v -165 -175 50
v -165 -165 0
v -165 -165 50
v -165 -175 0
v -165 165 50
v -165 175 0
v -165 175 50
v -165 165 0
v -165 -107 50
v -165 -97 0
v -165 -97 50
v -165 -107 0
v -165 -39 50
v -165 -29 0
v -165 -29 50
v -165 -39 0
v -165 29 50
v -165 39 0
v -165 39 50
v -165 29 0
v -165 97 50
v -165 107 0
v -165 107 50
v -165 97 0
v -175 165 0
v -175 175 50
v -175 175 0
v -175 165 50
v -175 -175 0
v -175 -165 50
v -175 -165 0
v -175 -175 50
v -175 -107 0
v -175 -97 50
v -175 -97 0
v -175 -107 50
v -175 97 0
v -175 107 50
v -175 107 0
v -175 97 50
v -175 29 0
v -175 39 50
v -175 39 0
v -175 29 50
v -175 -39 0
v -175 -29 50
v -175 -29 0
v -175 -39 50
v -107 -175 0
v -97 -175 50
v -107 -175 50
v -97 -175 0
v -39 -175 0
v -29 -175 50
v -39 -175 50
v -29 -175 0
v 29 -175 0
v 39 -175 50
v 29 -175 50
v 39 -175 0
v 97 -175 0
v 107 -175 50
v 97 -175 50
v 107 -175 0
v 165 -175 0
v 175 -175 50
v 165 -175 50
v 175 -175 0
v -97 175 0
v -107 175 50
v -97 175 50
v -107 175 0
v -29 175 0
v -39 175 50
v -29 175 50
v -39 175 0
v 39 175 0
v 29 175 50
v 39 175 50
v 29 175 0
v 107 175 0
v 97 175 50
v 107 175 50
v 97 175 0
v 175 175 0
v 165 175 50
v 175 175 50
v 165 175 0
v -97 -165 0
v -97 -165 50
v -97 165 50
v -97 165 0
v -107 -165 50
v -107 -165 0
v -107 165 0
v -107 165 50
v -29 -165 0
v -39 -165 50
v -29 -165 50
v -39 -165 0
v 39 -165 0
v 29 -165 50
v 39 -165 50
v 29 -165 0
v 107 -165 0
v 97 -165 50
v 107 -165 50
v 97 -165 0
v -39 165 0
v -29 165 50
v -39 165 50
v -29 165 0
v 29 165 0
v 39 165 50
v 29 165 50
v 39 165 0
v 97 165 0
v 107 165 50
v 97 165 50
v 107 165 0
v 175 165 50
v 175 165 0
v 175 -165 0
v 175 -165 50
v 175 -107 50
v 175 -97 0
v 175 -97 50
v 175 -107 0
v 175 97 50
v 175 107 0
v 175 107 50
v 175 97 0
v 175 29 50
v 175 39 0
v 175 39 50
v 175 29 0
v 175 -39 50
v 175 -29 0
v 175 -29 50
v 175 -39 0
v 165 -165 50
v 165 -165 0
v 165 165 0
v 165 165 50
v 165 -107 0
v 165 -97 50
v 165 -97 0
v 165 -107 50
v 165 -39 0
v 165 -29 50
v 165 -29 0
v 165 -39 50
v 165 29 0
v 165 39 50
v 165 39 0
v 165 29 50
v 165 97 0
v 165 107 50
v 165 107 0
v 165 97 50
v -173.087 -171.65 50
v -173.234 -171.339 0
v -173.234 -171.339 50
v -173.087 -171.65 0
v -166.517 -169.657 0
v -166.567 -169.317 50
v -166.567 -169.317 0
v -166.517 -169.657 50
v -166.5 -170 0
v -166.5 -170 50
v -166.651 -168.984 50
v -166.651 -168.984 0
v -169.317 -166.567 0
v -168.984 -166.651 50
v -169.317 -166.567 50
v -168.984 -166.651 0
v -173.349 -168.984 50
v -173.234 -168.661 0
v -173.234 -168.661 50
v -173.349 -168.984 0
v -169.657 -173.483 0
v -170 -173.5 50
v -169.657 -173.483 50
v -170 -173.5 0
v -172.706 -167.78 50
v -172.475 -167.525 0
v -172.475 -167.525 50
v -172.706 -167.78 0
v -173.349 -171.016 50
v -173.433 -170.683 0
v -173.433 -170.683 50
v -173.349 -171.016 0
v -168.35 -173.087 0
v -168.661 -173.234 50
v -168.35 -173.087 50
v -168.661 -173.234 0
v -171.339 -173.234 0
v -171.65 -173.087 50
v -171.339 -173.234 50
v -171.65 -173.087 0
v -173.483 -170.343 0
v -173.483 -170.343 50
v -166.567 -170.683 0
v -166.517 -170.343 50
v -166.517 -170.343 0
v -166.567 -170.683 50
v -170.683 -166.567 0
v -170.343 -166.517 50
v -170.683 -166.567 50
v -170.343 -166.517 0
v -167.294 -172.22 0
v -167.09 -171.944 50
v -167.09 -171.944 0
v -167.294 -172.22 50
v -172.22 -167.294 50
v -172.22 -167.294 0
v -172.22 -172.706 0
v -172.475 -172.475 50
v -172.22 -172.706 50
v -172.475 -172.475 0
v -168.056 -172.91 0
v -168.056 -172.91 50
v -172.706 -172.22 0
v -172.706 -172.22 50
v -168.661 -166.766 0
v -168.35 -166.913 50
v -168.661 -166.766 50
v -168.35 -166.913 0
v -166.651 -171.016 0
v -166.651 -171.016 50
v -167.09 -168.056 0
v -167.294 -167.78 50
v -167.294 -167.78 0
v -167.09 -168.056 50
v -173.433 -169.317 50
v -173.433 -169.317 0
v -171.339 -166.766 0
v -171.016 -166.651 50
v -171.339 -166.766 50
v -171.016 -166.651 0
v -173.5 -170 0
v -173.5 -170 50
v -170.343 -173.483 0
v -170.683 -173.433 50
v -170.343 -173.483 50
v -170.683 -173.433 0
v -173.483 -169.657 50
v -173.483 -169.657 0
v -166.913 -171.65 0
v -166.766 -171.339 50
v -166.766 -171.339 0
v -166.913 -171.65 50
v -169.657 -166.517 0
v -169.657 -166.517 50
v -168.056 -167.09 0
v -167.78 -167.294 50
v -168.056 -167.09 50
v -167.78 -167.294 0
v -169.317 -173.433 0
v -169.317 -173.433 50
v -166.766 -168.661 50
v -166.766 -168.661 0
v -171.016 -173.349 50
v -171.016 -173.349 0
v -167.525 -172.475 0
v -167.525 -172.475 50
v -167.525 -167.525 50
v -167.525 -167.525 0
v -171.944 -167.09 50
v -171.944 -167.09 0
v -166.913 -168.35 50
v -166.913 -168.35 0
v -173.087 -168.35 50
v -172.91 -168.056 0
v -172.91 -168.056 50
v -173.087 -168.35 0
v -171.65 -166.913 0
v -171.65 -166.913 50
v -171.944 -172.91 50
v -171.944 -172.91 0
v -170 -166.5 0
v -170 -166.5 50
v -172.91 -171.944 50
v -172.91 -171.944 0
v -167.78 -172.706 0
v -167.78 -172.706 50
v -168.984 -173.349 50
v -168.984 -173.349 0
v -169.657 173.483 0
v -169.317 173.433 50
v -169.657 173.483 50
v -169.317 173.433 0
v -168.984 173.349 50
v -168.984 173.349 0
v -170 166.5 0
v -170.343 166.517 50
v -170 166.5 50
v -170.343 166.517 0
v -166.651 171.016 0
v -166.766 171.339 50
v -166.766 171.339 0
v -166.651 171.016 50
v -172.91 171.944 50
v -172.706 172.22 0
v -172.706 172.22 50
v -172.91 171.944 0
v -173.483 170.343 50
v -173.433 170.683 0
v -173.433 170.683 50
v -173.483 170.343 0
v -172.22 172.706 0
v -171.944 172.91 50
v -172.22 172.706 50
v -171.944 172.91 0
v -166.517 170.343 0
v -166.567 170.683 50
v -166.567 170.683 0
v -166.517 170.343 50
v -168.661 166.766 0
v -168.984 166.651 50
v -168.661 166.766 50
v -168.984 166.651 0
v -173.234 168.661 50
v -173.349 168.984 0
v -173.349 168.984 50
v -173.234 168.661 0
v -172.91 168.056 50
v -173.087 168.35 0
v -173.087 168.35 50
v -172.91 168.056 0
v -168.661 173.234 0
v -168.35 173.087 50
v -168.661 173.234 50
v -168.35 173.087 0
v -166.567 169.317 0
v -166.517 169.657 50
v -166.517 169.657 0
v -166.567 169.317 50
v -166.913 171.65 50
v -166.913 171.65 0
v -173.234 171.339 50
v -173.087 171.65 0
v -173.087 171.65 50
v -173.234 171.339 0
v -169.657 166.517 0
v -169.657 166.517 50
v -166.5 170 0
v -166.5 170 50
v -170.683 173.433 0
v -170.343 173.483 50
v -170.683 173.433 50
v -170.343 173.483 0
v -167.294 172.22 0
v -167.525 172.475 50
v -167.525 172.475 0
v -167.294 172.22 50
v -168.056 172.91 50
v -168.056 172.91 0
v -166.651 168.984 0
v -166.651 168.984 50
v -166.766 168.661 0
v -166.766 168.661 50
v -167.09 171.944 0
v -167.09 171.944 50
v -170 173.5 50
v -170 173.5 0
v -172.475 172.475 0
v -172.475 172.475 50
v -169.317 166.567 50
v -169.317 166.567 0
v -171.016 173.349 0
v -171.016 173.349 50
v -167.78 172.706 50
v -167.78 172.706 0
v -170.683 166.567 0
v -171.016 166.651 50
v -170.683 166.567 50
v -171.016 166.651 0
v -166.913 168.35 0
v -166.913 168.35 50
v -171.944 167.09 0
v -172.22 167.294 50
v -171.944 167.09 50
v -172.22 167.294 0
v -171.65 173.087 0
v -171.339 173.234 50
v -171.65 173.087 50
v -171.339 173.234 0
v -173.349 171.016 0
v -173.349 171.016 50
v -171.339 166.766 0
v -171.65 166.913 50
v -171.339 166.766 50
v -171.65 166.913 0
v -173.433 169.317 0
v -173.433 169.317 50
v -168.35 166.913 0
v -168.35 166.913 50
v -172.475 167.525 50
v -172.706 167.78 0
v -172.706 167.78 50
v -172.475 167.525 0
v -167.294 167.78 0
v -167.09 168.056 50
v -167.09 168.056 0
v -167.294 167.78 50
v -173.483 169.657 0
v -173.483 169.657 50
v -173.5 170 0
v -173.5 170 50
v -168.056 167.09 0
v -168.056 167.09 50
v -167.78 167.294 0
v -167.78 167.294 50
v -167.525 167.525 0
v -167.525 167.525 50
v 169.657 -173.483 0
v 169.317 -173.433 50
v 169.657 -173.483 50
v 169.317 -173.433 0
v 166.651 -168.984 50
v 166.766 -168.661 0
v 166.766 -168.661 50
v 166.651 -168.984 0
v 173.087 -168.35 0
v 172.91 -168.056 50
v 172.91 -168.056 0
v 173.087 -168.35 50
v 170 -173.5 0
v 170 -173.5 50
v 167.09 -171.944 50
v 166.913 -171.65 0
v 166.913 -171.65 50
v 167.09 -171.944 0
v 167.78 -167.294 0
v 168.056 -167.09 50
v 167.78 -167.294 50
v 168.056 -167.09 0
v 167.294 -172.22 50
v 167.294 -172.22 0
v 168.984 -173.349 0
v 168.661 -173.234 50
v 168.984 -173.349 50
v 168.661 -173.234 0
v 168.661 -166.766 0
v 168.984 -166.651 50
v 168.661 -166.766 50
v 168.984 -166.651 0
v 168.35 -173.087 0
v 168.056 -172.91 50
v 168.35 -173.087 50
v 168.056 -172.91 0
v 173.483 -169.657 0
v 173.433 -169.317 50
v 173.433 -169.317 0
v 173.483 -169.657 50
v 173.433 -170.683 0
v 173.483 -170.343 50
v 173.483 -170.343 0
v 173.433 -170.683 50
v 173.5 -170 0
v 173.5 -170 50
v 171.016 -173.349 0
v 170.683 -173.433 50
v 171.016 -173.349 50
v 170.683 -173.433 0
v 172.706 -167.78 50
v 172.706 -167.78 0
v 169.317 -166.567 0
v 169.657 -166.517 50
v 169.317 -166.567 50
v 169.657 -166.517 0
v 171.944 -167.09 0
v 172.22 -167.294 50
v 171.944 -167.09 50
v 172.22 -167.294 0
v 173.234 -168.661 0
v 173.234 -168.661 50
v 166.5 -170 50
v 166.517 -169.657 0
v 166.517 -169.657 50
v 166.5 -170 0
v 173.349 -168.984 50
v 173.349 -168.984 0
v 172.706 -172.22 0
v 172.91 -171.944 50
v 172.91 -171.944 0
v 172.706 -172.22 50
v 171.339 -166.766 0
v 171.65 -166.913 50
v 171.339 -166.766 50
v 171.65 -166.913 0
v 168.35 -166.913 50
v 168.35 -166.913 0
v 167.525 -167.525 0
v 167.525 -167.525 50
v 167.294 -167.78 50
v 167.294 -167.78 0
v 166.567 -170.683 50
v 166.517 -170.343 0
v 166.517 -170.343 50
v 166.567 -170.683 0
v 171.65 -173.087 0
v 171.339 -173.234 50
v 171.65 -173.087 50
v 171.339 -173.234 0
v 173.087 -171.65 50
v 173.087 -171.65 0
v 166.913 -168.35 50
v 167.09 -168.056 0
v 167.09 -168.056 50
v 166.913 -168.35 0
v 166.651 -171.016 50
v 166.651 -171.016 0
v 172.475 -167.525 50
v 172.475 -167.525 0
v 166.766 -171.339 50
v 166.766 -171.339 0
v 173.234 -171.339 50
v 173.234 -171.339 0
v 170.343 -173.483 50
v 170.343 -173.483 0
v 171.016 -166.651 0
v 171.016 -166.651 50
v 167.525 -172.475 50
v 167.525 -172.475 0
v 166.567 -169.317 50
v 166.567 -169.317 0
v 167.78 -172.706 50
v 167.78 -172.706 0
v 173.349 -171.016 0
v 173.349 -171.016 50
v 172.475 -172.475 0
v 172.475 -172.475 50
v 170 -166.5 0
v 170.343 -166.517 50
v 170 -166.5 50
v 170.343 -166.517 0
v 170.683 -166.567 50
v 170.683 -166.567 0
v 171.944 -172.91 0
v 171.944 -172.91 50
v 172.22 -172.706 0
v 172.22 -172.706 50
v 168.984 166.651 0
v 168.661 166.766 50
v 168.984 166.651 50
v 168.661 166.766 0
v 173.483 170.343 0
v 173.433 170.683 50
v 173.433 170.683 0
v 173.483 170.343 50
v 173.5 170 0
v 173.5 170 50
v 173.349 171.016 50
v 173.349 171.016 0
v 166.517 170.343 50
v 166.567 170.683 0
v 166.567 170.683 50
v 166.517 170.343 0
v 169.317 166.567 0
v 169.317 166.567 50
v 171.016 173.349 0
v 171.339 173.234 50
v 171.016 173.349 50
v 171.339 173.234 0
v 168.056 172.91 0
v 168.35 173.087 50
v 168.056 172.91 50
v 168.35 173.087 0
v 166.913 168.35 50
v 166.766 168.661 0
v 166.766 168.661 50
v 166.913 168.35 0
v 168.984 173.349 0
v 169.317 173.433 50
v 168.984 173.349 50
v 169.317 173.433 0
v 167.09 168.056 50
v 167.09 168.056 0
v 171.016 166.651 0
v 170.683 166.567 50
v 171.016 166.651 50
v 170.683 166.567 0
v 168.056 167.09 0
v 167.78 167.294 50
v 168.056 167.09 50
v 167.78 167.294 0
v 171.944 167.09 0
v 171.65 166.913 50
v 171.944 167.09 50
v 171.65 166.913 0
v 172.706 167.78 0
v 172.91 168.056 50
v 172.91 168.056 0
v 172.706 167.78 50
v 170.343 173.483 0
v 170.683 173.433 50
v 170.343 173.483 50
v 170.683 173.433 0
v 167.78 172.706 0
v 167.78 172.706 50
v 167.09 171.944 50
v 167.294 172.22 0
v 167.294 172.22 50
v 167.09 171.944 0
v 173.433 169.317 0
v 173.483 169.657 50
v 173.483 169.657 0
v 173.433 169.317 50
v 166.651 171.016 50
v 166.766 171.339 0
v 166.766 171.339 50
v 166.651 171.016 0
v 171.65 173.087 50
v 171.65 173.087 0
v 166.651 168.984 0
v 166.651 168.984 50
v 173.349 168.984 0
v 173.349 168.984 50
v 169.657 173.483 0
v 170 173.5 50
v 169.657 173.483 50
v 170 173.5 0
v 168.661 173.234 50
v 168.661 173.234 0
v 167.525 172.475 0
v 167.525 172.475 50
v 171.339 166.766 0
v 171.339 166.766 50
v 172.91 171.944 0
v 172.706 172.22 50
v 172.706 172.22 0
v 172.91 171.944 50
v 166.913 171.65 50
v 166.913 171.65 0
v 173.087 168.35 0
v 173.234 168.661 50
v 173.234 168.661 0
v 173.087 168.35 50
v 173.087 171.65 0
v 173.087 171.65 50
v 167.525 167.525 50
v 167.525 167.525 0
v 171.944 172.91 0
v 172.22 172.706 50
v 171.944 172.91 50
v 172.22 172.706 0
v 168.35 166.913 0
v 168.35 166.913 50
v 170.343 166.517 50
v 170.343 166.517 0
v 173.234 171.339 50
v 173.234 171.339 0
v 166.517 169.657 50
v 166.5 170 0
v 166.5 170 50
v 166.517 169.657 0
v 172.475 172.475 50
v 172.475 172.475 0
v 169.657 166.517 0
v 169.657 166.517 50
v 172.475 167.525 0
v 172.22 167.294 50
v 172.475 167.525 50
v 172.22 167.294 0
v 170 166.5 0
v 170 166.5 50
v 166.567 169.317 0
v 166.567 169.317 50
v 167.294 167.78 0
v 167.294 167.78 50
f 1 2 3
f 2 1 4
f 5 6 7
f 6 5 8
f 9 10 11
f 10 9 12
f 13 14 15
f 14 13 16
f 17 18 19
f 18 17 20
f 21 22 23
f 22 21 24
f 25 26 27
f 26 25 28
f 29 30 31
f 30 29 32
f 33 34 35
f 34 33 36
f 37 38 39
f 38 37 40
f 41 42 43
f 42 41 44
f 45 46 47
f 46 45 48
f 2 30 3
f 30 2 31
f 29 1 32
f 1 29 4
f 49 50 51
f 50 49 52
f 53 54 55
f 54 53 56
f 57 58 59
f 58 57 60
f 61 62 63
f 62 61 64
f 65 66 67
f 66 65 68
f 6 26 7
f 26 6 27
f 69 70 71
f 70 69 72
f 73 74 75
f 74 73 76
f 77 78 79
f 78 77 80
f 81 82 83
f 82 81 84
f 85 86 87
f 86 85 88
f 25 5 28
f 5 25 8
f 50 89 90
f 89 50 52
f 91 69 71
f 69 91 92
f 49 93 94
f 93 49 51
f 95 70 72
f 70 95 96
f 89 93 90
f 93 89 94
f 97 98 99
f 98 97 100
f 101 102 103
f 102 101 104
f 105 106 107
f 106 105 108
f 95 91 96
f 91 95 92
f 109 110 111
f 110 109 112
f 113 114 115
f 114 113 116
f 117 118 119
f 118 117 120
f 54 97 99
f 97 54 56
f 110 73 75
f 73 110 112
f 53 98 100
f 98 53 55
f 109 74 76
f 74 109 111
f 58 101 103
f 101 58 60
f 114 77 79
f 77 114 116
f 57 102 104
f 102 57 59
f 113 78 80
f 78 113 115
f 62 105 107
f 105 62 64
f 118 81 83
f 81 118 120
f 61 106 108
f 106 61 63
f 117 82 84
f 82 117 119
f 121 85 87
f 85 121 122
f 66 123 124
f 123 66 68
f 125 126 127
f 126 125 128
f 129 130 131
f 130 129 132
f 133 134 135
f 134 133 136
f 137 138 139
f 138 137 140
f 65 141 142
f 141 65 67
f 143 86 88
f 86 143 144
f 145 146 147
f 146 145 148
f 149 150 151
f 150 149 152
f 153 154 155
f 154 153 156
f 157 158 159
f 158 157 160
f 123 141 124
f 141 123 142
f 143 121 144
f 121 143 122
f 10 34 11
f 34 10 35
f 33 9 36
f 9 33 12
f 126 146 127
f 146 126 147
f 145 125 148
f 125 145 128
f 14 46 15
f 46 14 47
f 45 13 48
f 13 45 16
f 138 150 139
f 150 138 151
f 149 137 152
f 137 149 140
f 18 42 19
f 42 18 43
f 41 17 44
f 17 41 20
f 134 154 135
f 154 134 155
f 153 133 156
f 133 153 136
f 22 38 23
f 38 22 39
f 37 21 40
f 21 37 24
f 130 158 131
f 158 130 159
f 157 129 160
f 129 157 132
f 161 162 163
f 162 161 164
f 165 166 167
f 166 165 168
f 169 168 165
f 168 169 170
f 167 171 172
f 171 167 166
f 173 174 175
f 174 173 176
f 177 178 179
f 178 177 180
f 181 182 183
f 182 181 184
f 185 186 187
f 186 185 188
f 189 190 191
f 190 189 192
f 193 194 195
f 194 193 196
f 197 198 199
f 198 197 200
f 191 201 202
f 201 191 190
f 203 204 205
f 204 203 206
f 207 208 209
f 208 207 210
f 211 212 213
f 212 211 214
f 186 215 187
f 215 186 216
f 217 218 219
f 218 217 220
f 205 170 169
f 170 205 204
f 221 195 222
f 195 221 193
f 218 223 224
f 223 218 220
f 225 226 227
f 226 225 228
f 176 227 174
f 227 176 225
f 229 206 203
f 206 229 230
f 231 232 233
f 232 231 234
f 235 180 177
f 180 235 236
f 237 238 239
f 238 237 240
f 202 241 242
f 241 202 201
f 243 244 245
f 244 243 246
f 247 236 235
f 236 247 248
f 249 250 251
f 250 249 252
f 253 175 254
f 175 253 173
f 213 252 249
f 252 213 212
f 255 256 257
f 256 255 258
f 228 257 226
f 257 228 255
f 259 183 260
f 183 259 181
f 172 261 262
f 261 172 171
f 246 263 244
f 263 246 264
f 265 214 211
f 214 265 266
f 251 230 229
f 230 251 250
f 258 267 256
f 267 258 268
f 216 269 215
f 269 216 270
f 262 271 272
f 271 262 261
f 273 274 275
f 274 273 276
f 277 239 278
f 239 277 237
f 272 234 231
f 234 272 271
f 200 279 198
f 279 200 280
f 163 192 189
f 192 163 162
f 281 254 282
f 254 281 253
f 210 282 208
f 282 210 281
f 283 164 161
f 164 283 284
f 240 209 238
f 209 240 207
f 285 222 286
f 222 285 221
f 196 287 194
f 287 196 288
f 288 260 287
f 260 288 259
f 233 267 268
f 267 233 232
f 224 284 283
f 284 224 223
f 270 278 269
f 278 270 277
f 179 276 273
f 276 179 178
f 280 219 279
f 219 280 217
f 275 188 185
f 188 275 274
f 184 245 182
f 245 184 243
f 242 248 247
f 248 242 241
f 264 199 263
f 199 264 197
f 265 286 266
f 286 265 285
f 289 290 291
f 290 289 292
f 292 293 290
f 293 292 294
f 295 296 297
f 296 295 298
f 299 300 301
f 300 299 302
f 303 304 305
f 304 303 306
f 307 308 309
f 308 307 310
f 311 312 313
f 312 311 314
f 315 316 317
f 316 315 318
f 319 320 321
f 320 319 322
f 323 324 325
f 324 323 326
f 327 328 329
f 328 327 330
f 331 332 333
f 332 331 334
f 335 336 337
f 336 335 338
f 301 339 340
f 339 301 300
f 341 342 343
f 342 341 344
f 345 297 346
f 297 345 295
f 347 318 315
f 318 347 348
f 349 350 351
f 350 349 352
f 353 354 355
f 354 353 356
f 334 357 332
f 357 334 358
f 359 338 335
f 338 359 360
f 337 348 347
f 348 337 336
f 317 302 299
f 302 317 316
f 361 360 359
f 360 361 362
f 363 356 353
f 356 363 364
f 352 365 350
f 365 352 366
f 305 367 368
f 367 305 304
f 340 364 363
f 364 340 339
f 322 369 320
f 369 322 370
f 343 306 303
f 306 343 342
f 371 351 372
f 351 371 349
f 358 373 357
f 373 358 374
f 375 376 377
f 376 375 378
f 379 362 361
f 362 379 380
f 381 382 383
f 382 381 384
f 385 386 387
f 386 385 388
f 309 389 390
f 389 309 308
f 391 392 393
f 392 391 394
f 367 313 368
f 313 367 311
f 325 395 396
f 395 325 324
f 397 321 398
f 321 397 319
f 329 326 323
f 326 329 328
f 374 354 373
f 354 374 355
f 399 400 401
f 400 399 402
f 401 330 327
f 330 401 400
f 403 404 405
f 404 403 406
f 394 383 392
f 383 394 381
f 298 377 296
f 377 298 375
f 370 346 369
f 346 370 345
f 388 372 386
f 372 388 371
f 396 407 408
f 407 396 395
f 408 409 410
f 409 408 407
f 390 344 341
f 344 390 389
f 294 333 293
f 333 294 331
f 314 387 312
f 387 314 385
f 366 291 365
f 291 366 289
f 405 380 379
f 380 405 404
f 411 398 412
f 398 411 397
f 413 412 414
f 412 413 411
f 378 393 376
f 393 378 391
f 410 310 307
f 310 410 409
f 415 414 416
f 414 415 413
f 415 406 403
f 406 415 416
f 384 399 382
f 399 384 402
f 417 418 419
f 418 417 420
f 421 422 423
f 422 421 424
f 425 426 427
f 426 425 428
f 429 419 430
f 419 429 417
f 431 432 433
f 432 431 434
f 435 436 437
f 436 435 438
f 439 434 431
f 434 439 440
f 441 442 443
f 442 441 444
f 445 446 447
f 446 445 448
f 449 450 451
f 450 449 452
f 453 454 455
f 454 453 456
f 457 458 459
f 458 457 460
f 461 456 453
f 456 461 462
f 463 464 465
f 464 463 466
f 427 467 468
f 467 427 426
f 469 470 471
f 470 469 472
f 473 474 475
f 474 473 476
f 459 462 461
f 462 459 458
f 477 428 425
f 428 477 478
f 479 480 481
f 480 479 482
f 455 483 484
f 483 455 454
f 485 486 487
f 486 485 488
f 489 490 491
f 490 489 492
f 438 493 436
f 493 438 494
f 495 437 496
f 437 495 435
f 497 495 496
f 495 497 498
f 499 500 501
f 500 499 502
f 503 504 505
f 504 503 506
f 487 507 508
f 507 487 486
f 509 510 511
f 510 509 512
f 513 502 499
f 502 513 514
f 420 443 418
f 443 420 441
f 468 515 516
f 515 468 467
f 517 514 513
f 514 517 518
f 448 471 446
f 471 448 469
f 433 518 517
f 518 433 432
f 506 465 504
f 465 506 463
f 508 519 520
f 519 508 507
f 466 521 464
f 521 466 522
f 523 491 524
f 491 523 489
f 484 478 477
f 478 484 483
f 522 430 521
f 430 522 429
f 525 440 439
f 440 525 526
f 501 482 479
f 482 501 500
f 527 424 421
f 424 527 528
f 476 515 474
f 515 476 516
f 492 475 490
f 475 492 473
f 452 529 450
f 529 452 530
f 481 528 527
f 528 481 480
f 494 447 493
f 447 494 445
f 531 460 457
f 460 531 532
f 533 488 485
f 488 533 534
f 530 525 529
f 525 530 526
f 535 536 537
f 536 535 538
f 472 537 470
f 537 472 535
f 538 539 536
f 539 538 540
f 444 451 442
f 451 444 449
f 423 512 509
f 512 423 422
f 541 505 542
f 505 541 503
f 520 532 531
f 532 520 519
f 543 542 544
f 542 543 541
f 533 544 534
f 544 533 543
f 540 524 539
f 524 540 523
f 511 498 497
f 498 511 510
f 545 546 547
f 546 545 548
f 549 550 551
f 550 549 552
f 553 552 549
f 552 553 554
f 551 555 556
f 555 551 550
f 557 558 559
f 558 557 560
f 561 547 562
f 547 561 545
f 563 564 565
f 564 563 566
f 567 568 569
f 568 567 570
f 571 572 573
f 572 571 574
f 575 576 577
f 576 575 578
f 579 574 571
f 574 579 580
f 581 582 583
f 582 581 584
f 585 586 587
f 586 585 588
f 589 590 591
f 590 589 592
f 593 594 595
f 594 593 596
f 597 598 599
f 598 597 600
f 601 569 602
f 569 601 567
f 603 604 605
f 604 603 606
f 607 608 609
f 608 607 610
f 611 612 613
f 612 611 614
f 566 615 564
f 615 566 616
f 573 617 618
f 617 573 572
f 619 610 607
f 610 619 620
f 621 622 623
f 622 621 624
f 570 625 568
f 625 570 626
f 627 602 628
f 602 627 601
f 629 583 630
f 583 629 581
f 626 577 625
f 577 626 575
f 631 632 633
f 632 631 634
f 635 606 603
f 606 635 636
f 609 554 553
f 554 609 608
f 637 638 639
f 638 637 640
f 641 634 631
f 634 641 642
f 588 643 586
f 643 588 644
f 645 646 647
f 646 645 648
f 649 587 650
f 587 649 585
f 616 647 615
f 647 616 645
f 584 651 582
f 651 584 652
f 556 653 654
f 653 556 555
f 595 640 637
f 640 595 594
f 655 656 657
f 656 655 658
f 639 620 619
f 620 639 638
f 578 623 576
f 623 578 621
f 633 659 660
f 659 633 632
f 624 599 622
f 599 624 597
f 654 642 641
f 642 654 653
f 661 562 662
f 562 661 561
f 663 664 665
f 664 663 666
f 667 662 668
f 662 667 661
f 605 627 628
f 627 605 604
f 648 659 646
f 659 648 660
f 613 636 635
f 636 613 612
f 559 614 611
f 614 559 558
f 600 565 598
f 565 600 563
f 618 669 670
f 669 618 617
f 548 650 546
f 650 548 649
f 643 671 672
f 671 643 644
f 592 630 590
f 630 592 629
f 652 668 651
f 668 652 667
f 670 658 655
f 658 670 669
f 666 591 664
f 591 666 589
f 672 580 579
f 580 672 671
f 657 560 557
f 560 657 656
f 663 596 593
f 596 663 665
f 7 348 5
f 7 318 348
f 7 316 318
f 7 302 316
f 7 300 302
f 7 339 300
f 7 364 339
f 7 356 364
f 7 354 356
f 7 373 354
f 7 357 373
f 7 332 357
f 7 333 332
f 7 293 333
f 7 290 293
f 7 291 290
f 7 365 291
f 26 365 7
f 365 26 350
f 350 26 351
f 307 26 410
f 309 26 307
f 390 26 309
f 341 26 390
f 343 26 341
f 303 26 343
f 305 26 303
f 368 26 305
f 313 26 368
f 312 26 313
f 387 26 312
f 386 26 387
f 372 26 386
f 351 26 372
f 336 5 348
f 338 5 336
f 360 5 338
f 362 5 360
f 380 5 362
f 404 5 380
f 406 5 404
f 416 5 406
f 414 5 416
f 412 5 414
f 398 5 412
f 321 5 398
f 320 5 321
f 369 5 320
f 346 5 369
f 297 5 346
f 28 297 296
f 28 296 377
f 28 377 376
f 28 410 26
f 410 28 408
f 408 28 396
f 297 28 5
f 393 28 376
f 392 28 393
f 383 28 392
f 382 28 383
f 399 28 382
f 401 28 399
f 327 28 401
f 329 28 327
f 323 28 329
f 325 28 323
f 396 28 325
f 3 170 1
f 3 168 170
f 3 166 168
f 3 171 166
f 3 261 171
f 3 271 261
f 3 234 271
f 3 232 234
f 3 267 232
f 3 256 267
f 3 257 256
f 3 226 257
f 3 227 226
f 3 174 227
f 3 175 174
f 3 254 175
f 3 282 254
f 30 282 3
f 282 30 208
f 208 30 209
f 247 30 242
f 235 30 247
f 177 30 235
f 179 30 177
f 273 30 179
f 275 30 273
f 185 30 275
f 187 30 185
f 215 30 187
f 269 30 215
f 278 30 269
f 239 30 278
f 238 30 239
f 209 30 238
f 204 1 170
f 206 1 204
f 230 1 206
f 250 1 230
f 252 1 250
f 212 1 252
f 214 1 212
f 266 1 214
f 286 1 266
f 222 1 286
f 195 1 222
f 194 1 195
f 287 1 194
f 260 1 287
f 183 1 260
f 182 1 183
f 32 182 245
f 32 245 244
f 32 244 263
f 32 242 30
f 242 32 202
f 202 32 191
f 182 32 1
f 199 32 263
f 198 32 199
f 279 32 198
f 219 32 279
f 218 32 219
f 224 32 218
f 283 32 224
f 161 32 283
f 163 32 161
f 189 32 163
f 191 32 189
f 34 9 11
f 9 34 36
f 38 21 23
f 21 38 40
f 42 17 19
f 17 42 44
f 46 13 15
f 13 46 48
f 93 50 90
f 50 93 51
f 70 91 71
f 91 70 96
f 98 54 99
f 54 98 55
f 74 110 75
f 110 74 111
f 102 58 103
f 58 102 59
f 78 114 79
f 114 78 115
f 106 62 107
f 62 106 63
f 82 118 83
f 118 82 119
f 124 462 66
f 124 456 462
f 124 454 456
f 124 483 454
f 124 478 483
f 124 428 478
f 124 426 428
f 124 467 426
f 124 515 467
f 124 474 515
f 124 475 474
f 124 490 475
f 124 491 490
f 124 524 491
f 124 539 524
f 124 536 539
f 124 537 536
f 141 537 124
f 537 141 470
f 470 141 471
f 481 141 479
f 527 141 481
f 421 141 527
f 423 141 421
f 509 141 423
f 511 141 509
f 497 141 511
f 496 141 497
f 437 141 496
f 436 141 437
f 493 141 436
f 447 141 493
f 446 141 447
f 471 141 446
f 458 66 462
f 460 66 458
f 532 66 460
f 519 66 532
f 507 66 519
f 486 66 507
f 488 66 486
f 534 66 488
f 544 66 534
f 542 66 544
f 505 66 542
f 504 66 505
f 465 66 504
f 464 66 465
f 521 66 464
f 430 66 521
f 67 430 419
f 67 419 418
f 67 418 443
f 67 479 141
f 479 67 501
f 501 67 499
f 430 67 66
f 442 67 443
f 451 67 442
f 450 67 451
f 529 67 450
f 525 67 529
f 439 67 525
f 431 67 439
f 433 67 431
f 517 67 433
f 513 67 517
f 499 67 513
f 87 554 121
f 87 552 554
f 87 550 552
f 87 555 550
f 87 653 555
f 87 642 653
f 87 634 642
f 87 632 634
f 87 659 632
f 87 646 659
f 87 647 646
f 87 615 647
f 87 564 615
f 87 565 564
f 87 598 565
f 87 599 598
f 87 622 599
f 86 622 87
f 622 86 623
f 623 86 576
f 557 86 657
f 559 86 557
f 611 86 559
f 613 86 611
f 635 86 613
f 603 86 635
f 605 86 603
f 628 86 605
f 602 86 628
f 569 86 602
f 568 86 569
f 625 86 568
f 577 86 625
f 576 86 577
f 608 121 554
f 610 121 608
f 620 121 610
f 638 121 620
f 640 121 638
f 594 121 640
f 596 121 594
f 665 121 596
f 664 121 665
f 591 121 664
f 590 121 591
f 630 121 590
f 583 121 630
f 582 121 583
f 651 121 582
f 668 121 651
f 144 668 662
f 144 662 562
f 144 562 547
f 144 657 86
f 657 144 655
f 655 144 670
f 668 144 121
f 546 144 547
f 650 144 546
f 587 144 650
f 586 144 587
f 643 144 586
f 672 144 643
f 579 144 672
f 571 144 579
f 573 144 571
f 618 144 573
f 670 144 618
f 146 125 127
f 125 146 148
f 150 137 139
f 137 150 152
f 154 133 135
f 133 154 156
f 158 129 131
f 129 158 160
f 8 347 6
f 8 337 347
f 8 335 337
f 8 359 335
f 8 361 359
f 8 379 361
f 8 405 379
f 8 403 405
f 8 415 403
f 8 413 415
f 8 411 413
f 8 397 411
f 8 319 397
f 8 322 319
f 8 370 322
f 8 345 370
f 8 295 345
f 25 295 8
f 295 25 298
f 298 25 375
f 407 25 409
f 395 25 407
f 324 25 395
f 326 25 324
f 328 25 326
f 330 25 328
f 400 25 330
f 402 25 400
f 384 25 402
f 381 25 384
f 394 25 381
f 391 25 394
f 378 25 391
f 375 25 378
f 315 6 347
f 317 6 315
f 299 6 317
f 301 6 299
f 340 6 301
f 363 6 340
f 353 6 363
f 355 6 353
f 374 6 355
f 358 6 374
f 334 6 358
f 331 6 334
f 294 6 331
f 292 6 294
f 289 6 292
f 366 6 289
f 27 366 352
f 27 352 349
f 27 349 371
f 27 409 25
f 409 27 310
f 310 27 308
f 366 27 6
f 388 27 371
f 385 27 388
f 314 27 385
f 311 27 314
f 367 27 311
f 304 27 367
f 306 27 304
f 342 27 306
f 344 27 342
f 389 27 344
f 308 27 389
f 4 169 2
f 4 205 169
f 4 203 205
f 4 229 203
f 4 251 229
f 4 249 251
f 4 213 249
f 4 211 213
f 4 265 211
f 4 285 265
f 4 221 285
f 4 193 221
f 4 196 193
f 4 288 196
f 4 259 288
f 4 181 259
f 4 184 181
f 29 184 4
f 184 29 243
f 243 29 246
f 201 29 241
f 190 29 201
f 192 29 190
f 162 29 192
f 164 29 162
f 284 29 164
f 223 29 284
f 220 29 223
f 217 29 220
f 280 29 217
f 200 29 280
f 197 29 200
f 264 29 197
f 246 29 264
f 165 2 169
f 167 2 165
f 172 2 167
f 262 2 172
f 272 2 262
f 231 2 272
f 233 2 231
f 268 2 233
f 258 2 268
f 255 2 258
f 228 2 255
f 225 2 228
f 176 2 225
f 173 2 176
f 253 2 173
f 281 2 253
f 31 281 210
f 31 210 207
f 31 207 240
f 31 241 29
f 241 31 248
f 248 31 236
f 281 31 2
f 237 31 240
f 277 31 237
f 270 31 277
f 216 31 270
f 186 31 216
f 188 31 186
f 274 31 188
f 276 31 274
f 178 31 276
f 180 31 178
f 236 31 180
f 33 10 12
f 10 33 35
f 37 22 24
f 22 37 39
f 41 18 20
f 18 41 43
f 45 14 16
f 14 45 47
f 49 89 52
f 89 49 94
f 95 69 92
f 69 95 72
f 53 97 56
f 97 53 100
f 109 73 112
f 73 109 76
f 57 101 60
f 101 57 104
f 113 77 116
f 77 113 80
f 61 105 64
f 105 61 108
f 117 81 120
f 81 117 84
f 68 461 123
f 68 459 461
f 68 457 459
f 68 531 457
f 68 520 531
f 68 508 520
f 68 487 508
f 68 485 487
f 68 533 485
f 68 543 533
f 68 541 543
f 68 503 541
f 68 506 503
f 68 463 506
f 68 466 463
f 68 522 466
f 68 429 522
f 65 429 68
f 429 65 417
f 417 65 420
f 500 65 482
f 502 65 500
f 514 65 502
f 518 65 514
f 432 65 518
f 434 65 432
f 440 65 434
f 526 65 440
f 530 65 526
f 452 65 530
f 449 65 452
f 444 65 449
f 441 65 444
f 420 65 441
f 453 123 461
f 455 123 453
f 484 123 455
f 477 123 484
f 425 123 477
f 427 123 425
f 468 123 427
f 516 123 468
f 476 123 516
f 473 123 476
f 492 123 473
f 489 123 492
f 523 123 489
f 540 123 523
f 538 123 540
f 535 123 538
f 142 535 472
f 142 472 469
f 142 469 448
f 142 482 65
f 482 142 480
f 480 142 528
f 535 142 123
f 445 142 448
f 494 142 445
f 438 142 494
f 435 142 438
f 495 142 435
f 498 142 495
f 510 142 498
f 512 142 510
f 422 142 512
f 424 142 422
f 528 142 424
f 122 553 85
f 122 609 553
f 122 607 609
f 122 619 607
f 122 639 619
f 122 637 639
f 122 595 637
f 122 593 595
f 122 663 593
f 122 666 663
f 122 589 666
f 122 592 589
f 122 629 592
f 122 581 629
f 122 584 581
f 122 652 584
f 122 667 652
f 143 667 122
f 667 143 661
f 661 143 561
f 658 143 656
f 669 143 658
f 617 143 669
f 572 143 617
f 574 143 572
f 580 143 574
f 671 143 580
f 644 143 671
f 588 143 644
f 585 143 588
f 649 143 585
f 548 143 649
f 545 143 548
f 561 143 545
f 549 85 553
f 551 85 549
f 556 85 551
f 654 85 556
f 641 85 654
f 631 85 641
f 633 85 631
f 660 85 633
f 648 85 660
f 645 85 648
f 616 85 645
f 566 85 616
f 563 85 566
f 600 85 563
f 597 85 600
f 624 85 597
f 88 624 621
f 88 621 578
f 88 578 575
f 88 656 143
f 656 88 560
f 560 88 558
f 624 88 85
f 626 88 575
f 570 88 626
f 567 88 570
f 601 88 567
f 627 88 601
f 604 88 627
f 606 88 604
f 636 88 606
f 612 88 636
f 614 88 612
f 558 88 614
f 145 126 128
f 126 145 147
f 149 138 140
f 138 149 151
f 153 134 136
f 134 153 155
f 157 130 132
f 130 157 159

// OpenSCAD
// Cage slice - index 10
bar = 10;
outer = 350;
half = outer / 2;
height = 700;

N_xy = 6;
N_z  = 11;

x_spacing = (outer - bar) / (N_xy - 1);
z_spacing = (height - bar) / (N_z  - 1);

xs = [ for (i = [0 : N_xy - 1]) (-half + bar/2 + i * x_spacing) ];
ys = xs;

zs = [ for (k = [0 : N_z - 1]) (bar/2 + k * z_spacing) ];

$fn = 64;

module cage_bars() {
    union() {
        // Vertical bars on front and back faces
        for (xv = xs) {
            translate([xv, -half + bar/2, height/2])
                cube([bar, bar, height], center = true);
            translate([xv,  half - bar/2, height/2])
                cube([bar, bar, height], center = true);
        }

        // Vertical bars on left and right faces
        for (yv = ys) {
            translate([-half + bar/2, yv, height/2])
                cube([bar, bar, height], center = true);
            translate([ half - bar/2, yv, height/2])
                cube([bar, bar, height], center = true);
        }

        // Horizontal x-bars on front and back faces
        for (zv = zs) {
            translate([0, -half + bar/2, zv])
                cube([outer, bar, bar], center = true);
            translate([0,  half - bar/2, zv])
                cube([outer, bar, bar], center = true);
        }

        // Horizontal y-bars on left and right faces
        for (zv = zs) {
            translate([-half + bar/2, 0, zv])
                cube([bar, outer, bar], center = true);
            translate([ half - bar/2, 0, zv])
                cube([bar, outer, bar], center = true);
        }

        // Floor and ceiling extra x-bars at all y positions
        z_floor = bar/2;
        z_ceil  = height - bar/2;
        for (yv = ys) {
            translate([0, yv, z_floor])
                cube([outer, bar, bar], center = true);
            translate([0, yv, z_ceil])
                cube([outer, bar, bar], center = true);
        }

        // Floor and ceiling extra y-bars at all x positions
        for (xv = xs) {
            translate([xv, 0, z_floor])
                cube([bar, outer, bar], center = true);
            translate([xv, 0, z_ceil])
                cube([bar, outer, bar], center = true);
        }
    }
}

module corner_holes() {
    hole_d = 7;
    for (sx = [-1, 1])
        for (sy = [-1, 1])
            translate([sx * (half - bar/2), sy * (half - bar/2), height/2])
                cylinder(h = height + 2, d = hole_d, center = true);
}

module cage_full() {
    difference() {
        cage_bars();
        corner_holes();
    }
}

slice_index = 10;
slice_height = 50;

module cage_slice() {
    translate([0, 0, -slice_index * slice_height]) {
        intersection() {
            cage_full();
            translate([0, 0, slice_index * slice_height + slice_height/2])
                cube([outer + 20, outer + 20, slice_height], center = true);
        }
    }
}

cage_slice();
